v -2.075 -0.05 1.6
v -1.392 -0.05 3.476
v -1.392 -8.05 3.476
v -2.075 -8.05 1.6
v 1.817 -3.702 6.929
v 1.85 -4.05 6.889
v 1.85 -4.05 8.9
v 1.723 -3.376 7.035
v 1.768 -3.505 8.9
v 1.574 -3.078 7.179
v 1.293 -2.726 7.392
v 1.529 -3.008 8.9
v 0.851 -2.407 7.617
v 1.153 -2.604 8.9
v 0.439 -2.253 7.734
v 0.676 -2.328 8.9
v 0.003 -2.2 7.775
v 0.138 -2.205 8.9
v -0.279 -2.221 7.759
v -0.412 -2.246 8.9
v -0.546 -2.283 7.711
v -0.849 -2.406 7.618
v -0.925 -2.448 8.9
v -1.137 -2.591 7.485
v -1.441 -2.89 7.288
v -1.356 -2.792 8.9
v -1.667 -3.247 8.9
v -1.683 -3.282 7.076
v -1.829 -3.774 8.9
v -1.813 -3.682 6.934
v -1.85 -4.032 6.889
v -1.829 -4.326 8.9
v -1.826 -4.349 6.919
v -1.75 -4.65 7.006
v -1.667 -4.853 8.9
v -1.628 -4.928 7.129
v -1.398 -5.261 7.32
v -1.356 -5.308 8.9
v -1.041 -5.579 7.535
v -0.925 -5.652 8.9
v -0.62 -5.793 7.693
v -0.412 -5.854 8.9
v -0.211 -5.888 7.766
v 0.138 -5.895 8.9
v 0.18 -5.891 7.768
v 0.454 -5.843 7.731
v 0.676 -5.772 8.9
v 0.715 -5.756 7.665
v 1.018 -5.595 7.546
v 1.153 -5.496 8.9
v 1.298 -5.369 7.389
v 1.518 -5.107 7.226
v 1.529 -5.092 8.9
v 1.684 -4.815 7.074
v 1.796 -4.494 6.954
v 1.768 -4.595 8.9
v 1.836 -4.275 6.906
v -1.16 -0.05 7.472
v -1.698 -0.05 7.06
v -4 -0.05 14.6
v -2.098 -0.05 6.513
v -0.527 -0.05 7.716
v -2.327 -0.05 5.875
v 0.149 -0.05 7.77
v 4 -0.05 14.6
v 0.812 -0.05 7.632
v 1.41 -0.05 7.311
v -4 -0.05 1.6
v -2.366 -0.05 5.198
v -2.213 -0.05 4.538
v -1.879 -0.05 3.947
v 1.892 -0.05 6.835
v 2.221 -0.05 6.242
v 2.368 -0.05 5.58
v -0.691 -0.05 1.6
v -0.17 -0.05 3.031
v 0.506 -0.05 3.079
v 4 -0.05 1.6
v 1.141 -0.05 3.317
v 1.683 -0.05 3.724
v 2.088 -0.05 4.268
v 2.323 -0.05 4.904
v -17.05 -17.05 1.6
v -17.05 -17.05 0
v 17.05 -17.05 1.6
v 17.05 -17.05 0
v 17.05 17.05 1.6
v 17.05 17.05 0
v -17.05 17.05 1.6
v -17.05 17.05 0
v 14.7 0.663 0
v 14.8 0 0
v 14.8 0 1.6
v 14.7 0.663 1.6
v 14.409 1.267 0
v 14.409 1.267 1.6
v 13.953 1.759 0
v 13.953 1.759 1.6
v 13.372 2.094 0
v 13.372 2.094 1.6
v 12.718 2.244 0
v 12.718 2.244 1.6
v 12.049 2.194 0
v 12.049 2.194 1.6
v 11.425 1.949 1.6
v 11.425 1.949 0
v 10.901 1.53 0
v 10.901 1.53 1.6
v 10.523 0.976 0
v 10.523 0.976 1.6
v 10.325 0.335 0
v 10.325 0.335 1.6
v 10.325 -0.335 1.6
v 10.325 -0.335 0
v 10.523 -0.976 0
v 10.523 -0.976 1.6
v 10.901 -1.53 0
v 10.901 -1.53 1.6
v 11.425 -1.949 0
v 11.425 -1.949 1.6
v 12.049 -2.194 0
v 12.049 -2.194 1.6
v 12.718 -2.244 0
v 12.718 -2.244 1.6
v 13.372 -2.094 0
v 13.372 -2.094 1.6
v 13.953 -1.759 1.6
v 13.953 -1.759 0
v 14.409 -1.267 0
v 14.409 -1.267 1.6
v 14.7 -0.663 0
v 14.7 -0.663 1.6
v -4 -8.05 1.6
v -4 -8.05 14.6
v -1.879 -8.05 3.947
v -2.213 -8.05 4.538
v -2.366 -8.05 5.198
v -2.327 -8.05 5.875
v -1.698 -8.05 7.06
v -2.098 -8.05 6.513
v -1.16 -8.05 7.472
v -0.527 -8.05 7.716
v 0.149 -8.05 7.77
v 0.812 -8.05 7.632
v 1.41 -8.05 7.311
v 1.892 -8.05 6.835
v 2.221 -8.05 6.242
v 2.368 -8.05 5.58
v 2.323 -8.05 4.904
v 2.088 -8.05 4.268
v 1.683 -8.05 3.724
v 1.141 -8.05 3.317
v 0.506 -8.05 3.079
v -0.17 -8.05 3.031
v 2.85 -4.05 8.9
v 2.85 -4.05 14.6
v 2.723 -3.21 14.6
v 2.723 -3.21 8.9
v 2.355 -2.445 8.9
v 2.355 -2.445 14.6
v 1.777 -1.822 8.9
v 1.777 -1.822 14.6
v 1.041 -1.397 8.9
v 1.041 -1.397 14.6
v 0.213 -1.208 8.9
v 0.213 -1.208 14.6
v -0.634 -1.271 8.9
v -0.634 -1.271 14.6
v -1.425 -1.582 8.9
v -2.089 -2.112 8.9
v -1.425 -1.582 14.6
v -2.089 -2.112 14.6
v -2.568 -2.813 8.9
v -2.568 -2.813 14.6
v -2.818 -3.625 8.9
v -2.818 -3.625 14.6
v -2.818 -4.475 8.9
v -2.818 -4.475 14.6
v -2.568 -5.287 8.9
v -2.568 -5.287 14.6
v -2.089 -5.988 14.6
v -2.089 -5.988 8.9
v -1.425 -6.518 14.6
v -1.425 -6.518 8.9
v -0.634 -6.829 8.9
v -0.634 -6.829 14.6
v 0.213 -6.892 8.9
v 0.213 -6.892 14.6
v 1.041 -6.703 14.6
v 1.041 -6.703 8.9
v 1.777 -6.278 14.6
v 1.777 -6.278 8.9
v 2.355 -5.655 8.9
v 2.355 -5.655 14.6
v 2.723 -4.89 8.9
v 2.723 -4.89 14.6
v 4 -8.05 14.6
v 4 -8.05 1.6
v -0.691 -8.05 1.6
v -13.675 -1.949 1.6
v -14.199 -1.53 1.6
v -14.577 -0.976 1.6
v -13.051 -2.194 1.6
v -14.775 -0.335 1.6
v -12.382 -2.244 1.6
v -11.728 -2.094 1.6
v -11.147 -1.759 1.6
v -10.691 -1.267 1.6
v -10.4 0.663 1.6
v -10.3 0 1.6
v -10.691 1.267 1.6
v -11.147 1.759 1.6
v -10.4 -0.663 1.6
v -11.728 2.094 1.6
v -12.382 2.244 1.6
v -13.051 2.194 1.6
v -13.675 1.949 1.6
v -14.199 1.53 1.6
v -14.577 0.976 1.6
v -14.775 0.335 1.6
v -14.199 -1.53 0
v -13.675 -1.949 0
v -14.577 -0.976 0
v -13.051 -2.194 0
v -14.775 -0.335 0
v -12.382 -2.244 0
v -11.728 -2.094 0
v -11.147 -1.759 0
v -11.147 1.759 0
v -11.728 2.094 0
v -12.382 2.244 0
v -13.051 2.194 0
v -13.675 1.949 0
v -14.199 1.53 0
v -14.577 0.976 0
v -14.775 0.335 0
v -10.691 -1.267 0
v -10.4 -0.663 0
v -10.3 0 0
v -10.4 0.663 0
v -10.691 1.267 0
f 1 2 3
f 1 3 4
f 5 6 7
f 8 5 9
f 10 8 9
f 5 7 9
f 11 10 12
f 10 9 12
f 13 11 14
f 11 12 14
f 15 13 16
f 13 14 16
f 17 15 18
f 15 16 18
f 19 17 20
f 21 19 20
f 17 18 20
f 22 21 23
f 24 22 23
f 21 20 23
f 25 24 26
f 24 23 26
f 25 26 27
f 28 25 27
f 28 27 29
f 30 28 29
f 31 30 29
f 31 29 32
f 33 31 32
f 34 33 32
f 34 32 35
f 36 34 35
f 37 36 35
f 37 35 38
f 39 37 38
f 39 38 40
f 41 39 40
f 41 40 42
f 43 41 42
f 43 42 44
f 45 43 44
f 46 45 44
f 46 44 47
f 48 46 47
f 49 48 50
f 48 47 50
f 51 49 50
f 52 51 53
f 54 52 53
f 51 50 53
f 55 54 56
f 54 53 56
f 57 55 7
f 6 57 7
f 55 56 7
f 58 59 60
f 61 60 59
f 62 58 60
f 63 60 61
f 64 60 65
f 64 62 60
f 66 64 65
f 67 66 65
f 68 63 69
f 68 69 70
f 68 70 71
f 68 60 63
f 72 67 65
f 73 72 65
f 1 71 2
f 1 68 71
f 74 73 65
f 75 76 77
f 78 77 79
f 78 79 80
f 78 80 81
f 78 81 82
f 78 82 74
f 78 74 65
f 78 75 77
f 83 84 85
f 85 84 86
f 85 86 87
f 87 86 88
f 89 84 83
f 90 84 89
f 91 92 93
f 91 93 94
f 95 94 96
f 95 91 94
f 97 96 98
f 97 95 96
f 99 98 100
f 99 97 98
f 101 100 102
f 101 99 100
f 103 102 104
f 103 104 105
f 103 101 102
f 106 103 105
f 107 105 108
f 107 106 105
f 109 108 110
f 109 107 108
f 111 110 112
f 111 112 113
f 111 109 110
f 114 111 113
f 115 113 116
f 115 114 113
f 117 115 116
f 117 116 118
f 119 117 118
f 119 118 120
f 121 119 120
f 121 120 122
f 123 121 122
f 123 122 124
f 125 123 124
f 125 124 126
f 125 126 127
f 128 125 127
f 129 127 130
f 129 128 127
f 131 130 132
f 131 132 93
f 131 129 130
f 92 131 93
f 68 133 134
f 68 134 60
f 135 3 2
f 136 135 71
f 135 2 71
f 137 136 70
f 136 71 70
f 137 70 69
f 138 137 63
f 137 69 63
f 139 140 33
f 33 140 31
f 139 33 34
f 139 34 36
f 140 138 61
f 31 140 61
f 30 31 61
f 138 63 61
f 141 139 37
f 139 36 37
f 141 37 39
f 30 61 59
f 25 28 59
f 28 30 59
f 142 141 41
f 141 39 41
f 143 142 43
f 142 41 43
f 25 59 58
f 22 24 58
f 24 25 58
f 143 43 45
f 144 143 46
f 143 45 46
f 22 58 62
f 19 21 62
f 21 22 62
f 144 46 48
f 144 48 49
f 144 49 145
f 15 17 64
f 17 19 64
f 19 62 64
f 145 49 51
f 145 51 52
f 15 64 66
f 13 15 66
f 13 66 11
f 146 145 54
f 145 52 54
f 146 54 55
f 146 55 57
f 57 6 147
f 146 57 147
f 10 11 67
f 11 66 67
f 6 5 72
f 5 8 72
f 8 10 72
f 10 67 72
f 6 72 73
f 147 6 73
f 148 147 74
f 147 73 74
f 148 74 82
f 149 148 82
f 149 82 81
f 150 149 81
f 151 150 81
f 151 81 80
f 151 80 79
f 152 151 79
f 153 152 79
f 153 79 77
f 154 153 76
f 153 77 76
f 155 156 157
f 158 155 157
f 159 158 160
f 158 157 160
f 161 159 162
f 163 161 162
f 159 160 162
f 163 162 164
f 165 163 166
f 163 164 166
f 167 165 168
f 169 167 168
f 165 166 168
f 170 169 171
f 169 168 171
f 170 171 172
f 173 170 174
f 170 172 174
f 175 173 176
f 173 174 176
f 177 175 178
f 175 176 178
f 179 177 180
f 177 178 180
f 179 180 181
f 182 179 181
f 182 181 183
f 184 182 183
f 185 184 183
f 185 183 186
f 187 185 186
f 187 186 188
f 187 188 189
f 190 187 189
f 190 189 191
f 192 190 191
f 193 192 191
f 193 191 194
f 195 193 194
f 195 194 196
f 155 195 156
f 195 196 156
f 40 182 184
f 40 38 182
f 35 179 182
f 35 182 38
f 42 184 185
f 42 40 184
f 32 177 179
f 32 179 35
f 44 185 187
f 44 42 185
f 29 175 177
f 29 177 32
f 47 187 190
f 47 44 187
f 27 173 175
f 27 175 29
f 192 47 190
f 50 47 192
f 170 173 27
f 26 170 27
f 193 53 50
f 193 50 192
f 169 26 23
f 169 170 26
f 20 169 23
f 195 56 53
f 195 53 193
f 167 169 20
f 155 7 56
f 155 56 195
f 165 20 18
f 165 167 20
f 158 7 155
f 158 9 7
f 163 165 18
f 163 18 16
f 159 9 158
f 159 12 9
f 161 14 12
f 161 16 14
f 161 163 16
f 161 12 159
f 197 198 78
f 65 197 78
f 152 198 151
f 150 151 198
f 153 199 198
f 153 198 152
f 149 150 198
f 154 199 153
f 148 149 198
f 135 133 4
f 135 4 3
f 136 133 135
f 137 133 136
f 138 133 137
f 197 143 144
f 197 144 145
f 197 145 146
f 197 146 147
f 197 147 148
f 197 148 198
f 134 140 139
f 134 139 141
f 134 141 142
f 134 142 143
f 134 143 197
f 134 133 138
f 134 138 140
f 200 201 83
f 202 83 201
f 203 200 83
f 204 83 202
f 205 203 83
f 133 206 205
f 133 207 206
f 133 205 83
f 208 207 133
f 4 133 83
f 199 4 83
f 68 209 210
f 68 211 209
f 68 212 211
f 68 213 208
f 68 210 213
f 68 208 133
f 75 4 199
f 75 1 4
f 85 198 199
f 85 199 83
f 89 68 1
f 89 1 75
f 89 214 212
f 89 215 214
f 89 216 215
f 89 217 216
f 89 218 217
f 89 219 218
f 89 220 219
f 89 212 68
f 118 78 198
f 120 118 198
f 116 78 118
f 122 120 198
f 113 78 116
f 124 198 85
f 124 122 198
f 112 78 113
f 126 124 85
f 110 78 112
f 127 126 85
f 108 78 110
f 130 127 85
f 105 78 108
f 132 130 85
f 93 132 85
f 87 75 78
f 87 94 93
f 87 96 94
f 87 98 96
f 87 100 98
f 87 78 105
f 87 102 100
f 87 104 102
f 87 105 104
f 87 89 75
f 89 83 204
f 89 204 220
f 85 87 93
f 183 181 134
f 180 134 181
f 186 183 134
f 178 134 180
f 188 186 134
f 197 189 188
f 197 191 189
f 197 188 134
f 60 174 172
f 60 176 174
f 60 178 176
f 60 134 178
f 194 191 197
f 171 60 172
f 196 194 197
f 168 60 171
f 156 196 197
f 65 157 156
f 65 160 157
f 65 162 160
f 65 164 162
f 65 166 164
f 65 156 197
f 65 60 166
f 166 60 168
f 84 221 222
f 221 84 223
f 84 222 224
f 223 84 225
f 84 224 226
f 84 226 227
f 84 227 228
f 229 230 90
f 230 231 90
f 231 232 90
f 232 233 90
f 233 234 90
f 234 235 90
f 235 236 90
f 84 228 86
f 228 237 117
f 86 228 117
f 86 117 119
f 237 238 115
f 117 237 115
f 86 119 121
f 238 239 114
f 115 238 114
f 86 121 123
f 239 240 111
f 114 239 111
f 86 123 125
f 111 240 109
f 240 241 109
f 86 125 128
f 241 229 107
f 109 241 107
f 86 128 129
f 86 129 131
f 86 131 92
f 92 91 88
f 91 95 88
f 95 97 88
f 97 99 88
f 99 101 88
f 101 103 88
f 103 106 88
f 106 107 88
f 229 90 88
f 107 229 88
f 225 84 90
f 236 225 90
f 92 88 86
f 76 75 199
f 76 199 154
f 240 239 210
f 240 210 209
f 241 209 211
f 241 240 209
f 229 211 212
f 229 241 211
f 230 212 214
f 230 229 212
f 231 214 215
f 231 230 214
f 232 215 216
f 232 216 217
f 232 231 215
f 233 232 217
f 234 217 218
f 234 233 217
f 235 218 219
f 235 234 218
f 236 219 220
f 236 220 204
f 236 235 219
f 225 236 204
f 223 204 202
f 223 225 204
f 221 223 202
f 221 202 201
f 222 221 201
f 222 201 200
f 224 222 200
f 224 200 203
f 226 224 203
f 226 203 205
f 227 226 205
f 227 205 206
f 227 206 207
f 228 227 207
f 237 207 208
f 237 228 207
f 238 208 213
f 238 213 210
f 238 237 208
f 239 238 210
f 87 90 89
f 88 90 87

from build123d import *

# Parameters (mm, degrees)
SKETCH1_W           = 34.1
SKETCH1_H           = 34.1
SKETCH1_R           = 2.25
BOSS_EXTRUDE1_DEPTH = 1.6
SKETCH2_W           = 8
SKETCH2_H           = 17
BOSS_EXTRUDE2_DEPTH = 13
SKETCH12_R          = 2.375
CUT_EXTRUDE3_DEPTH  = 18
CUT_EXTRUDE4_DEPTH  = 12
SKETCH14_R          = 2.85
CUT_EXTRUDE9_DEPTH  = 5.7
CUT_EXTRUDE10_REACH = 10.9
SKETCH15_R          = 1.85
SKETCH19_W          = 13
SKETCH19_H          = 9
CUT_EXTRUDE11_DEPTH = 22.05


with BuildPart() as part:
    # Sketch1 → Boss-Extrude1 (new body)
    with BuildSketch(Plane.XY):
        Rectangle(SKETCH1_W, SKETCH1_H)
        with Locations((-12.55, 0)):
            Circle(SKETCH1_R, mode=Mode.SUBTRACT)
        with Locations((12.55, 0)):
            Circle(SKETCH1_R, mode=Mode.SUBTRACT)
    extrude(amount=BOSS_EXTRUDE1_DEPTH)

    # Sketch2 → Boss-Extrude2 (add)
    with BuildSketch(Plane.XY.offset(1.6)):
        with Locations((0, -8.55)):
            Rectangle(SKETCH2_W, SKETCH2_H)
    extrude(amount=BOSS_EXTRUDE2_DEPTH)

    # Sketch12 → Cut-Extrude3 (cut, through all)
    with BuildSketch(Plane(origin=(0, -0.05, 0), x_dir=(1, 0, 0), z_dir=(0, 1, 0))):
        with Locations((0, -5.4)):
            Circle(SKETCH12_R)
    extrude(amount=-CUT_EXTRUDE3_DEPTH, mode=Mode.SUBTRACT)

    # Sketch13 → Cut-Extrude4 (cut)
    with BuildSketch(Plane(origin=(0, -0.05, 0), x_dir=(1, 0, 0), z_dir=(0, 1, 0))):
        Polygon((-1.392084192, -3.475752978), (-2.074802442, -1.6), (-0.691371338, -1.6), (-0.170483785, -3.031126791), align=None)
    extrude(amount=-CUT_EXTRUDE4_DEPTH, mode=Mode.SUBTRACT)

    # Sketch14 → Cut-Extrude9 (cut)
    with BuildSketch(Plane.XY.offset(14.6)):
        with Locations((0, -12.55)):
            Circle(SKETCH14_R)
        with Locations((0, -4.05)):
            Circle(SKETCH14_R)
    extrude(amount=-CUT_EXTRUDE9_DEPTH, mode=Mode.SUBTRACT)

    # Sketch15 → Cut-Extrude10 (cut, up to next)
    with BuildSketch(Plane.XY.offset(8.9), mode=Mode.PRIVATE) as cut_extrude10_sk1:
        with Locations((0, -4.05)):
            Circle(SKETCH15_R)
    cut_extrude10_tool1 = extrude(cut_extrude10_sk1.sketch, amount=-CUT_EXTRUDE10_REACH, mode=Mode.PRIVATE) & part.part
    add(cut_extrude10_tool1.solids().sort_by_distance((0, -4.05, 8.9))[0], mode=Mode.SUBTRACT)
    # Sketch15 → Cut-Extrude10 (cut, up to next)
    with BuildSketch(Plane.XY.offset(8.9), mode=Mode.PRIVATE) as cut_extrude10_sk2:
        with Locations((0, -12.55)):
            Circle(SKETCH15_R)
    cut_extrude10_tool2 = extrude(cut_extrude10_sk2.sketch, amount=-CUT_EXTRUDE10_REACH, mode=Mode.PRIVATE) & part.part
    add(cut_extrude10_tool2.solids().sort_by_distance((0, -12.55, 8.9))[0], mode=Mode.SUBTRACT)

    # Sketch19 → Cut-Extrude11 (cut, through all)
    with BuildSketch(Plane.ZY.offset(4)):
        with Locations((8.1, -12.55)):
            Rectangle(SKETCH19_W, SKETCH19_H)
    extrude(amount=-CUT_EXTRUDE11_DEPTH, mode=Mode.SUBTRACT)


solid = part.part
